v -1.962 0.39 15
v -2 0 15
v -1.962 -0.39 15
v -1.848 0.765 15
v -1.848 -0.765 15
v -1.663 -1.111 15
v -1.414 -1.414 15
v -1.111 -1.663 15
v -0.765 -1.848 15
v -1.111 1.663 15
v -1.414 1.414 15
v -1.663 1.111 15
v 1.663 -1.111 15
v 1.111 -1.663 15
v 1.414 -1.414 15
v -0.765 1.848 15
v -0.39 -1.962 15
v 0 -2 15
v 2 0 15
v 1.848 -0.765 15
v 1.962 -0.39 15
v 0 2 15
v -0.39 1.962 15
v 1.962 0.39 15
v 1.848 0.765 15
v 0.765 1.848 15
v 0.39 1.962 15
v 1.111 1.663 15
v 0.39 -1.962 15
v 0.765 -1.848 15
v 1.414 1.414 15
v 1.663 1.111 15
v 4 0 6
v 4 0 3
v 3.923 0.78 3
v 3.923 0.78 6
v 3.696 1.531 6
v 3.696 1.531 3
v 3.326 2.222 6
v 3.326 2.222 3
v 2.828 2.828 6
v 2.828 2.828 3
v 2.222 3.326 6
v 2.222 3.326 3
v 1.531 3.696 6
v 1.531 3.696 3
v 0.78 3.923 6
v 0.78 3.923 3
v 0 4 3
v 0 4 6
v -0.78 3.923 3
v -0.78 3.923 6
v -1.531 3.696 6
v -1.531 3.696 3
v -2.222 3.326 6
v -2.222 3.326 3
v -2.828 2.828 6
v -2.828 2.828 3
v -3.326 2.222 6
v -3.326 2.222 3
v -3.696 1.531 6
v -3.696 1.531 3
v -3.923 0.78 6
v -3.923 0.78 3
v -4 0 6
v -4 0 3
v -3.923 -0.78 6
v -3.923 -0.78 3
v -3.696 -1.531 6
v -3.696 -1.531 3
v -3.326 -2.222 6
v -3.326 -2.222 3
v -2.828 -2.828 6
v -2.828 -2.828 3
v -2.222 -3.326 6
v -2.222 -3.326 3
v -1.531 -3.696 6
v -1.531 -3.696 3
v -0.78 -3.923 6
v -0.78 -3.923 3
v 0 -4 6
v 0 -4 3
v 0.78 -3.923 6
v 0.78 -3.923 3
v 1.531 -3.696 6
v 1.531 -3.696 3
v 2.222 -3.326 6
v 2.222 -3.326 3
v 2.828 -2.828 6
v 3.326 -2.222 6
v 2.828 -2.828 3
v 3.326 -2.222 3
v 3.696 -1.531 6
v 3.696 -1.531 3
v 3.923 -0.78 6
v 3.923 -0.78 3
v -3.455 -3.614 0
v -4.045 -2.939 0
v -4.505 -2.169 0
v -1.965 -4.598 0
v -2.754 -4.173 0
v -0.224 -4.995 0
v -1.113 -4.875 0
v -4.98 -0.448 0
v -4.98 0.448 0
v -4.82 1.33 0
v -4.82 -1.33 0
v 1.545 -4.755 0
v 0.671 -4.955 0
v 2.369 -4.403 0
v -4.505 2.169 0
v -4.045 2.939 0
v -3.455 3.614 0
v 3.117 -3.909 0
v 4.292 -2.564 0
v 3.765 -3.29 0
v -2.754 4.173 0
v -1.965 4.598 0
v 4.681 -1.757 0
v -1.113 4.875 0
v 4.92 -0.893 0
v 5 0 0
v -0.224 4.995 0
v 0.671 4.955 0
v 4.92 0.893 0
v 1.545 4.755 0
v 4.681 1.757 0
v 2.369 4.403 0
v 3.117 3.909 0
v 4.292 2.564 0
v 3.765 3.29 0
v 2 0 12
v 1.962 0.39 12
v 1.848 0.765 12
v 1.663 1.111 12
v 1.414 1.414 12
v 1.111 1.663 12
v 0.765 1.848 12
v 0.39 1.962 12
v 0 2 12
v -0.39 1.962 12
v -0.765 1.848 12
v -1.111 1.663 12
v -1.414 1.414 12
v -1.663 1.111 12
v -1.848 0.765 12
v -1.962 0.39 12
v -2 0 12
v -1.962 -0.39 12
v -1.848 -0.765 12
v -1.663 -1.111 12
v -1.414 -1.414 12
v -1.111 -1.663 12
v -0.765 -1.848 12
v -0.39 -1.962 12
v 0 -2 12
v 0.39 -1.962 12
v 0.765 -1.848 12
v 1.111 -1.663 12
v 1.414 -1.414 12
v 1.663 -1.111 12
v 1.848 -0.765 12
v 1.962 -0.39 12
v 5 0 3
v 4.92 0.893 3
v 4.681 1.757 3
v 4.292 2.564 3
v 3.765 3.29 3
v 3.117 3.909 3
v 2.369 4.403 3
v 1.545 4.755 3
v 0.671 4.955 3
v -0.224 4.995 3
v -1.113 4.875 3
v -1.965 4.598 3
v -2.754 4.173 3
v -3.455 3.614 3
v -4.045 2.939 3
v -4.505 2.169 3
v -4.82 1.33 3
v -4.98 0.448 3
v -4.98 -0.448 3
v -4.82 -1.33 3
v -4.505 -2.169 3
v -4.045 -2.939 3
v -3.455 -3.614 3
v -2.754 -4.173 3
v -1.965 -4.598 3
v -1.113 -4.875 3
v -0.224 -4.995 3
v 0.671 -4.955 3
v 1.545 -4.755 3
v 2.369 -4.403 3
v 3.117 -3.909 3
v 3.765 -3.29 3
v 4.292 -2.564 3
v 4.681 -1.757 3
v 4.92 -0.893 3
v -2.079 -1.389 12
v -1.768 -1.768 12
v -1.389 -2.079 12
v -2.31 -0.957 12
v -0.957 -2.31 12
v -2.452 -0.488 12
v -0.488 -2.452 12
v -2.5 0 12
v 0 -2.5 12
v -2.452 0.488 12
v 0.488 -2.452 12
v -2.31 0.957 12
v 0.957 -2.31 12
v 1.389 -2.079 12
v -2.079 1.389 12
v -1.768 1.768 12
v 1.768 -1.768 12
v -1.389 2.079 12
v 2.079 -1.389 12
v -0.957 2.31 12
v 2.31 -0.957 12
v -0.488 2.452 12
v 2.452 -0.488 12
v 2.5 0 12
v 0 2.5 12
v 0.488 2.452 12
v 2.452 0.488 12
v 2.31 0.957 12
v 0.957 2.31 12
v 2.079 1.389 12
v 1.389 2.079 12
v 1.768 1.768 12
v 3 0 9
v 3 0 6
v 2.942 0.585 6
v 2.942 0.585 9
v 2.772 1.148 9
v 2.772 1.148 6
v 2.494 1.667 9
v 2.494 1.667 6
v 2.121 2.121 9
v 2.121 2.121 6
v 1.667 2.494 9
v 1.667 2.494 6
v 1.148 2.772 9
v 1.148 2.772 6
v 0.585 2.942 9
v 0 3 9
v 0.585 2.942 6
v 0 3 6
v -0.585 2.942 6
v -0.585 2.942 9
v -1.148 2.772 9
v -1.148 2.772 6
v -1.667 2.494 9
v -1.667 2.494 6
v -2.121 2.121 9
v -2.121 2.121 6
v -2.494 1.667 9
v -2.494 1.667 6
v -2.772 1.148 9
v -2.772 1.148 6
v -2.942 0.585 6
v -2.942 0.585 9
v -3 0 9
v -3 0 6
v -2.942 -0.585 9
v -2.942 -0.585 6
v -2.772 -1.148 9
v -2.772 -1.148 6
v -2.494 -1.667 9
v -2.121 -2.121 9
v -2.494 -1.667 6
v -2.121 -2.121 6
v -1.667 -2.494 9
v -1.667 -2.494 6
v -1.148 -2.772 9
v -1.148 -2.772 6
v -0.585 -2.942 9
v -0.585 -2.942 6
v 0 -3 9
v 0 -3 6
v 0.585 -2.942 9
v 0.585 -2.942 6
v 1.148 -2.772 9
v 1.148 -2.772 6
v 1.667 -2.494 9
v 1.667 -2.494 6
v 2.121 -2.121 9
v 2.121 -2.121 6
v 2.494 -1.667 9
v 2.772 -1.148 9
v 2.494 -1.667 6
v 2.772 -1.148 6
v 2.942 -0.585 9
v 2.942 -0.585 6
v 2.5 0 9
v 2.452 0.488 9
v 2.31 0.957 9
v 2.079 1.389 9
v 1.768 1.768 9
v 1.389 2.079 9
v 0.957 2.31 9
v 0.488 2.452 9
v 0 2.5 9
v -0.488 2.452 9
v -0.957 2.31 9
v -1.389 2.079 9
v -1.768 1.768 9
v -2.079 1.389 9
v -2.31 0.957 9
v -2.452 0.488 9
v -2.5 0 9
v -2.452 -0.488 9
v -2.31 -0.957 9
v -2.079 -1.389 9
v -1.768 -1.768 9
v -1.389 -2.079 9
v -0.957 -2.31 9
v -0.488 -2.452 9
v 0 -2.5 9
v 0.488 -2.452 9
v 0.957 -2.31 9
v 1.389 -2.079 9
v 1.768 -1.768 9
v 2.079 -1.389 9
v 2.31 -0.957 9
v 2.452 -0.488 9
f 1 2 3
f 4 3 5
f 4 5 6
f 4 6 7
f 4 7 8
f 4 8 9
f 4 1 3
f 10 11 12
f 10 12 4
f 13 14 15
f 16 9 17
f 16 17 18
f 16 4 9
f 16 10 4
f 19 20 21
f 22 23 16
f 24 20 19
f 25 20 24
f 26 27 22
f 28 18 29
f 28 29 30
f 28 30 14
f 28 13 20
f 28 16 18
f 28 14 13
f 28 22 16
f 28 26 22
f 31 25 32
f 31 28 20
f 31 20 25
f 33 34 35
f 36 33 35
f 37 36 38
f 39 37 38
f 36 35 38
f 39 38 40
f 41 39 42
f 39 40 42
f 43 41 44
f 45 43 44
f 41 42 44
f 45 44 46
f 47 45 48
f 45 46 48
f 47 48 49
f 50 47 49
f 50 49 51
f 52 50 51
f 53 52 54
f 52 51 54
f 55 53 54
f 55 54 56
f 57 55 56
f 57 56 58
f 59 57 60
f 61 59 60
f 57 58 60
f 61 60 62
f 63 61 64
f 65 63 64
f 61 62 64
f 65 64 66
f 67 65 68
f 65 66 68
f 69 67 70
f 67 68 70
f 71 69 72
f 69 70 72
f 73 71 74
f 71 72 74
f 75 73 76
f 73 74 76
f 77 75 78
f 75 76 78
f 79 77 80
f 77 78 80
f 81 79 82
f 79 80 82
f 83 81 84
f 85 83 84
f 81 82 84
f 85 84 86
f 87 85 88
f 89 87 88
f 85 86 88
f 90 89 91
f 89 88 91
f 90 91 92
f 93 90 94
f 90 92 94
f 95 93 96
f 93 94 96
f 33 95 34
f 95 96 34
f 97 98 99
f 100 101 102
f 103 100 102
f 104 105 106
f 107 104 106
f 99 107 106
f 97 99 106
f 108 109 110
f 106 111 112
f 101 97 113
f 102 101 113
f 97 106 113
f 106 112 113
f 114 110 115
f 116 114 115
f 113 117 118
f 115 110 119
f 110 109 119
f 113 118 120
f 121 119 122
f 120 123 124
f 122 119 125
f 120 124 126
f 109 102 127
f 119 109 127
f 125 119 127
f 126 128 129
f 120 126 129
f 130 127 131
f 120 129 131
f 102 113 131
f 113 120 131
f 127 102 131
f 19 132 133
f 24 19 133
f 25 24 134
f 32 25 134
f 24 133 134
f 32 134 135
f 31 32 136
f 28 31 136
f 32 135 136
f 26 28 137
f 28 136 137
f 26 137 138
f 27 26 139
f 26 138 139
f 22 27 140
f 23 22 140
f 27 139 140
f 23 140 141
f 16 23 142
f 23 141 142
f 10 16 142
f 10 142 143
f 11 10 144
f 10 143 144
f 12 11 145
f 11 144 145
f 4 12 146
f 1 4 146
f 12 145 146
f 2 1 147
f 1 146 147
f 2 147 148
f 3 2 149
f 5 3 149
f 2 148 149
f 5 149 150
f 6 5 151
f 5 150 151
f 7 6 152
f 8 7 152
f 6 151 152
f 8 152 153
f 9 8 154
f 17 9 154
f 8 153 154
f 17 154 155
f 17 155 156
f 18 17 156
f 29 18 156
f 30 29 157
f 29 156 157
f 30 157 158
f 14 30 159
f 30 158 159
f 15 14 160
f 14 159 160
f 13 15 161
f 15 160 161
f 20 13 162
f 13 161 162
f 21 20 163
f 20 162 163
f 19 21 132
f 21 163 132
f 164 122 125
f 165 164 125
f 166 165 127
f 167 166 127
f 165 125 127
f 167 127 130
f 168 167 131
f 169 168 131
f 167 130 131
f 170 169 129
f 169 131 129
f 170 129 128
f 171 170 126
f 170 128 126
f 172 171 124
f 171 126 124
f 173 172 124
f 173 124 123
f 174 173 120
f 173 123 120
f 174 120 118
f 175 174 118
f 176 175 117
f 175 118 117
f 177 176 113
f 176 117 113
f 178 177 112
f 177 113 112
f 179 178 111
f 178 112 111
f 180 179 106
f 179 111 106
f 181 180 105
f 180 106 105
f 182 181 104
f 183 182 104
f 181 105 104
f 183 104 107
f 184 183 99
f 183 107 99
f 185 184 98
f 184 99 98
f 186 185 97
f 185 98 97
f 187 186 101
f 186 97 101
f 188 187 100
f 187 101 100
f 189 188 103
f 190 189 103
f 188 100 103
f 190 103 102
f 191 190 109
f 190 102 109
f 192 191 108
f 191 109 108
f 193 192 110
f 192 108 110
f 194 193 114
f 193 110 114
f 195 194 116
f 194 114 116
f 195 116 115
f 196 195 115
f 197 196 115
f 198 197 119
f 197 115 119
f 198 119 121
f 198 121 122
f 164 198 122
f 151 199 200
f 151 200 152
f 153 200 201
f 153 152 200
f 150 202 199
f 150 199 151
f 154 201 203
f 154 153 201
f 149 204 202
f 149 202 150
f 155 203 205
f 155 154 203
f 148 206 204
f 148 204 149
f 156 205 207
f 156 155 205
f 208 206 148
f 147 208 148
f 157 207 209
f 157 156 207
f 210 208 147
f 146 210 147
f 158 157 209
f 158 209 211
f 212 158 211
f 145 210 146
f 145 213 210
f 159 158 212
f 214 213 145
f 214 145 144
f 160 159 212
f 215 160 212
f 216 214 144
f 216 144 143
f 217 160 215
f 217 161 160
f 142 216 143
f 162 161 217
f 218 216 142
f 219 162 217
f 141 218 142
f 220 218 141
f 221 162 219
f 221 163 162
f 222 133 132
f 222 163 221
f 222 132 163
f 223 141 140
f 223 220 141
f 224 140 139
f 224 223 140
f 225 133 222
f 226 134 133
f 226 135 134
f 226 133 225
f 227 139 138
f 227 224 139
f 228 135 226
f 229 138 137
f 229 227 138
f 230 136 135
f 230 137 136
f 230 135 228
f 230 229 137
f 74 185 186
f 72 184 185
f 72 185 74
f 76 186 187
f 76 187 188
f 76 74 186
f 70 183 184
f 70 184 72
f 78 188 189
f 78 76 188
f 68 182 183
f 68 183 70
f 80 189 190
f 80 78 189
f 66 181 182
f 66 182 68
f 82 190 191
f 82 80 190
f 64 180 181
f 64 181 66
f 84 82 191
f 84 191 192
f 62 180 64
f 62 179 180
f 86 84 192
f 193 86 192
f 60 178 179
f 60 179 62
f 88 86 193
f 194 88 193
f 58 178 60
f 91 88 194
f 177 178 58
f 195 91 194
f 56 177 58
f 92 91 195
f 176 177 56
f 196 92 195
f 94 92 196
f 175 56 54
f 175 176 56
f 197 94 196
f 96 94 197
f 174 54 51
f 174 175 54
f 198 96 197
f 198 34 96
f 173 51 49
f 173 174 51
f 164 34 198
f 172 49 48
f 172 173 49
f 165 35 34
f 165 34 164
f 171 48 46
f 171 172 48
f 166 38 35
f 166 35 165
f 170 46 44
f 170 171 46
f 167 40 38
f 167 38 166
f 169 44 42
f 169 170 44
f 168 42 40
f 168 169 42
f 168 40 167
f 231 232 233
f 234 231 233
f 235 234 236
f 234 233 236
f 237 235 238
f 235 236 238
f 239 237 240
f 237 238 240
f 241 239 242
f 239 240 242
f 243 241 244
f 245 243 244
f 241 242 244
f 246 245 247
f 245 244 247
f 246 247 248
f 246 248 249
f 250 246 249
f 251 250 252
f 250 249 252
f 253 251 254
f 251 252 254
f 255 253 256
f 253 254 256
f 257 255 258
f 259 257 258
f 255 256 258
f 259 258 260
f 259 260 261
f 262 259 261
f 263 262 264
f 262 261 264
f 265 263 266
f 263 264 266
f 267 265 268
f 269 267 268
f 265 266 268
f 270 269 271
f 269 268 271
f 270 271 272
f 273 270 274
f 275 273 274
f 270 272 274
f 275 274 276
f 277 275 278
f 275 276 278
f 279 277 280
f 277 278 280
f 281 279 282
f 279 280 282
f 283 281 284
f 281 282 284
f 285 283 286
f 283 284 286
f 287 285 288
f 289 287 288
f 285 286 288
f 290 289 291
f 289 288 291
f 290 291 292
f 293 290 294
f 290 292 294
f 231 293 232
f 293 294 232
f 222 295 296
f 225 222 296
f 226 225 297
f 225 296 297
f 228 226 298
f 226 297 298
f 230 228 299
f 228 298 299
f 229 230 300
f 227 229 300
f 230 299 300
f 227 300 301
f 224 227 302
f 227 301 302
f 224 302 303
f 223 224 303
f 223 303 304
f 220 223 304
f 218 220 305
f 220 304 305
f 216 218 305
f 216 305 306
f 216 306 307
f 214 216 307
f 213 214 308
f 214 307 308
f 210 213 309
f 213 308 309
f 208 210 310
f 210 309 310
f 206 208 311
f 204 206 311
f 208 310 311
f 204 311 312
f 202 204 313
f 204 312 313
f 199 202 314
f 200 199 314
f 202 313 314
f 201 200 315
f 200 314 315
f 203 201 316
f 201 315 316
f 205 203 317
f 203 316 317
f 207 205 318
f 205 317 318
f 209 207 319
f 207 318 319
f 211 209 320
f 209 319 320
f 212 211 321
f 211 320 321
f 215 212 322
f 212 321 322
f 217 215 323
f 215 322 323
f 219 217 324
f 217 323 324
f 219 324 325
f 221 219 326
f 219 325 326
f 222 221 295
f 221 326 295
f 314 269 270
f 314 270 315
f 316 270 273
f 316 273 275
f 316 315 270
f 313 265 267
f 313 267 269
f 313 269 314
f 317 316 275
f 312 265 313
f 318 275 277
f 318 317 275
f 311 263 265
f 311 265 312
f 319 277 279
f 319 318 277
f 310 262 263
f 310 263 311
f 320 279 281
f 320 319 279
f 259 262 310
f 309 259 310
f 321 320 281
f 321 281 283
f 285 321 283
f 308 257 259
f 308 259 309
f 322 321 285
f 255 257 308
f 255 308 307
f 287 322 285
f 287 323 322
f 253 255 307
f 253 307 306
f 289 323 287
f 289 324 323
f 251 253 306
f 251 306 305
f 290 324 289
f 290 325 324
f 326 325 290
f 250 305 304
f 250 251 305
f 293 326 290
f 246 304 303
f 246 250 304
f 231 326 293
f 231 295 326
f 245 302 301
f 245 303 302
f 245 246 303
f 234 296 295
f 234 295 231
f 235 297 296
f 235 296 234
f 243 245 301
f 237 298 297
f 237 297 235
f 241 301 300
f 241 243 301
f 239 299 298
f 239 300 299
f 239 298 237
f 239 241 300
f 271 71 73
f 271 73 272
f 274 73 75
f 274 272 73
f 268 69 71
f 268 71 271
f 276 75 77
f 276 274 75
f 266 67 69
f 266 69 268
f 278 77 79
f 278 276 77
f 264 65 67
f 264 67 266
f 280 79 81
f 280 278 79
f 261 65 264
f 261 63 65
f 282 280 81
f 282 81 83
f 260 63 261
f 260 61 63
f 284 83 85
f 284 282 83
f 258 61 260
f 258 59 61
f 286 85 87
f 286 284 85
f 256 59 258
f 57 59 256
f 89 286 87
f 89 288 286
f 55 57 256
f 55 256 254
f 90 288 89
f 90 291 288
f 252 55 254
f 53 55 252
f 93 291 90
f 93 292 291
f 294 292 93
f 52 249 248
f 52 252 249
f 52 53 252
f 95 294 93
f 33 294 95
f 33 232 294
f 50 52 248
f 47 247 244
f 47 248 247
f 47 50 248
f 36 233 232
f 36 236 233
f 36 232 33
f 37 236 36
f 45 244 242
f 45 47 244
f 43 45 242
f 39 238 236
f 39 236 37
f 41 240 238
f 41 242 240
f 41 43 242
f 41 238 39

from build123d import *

# Parameters (mm, degrees)
F0_R     = 5
F1_DEPTH = 3
F2_R     = 4
F3_DEPTH = 3
F4_R     = 3
F5_DEPTH = 3
F6_R     = 2.5
F7_DEPTH = 3
F8_R     = 2
F9_DEPTH = 3


with BuildPart() as f1:
    # F0 (on Top) → F1 (new body)
    with BuildSketch(Plane.XY):
        Circle(F0_R)
    extrude(amount=F1_DEPTH)

    # F2 (on face) → F3 (join)
    with BuildSketch(Plane.XY.offset(3)):
        Circle(F2_R)
    extrude(amount=F3_DEPTH)

    # F4 (on face) → F5 (join)
    with BuildSketch(Plane.XY.offset(6)):
        Circle(F4_R)
    extrude(amount=F5_DEPTH)

    # F6 (on face) → F7 (join)
    with BuildSketch(Plane.XY.offset(9)):
        Circle(F6_R)
    extrude(amount=F7_DEPTH)

    # F8 (on face) → F9 (join)
    with BuildSketch(Plane.XY.offset(12)):
        Circle(F8_R)
    extrude(amount=F9_DEPTH)


solid = f1.part
